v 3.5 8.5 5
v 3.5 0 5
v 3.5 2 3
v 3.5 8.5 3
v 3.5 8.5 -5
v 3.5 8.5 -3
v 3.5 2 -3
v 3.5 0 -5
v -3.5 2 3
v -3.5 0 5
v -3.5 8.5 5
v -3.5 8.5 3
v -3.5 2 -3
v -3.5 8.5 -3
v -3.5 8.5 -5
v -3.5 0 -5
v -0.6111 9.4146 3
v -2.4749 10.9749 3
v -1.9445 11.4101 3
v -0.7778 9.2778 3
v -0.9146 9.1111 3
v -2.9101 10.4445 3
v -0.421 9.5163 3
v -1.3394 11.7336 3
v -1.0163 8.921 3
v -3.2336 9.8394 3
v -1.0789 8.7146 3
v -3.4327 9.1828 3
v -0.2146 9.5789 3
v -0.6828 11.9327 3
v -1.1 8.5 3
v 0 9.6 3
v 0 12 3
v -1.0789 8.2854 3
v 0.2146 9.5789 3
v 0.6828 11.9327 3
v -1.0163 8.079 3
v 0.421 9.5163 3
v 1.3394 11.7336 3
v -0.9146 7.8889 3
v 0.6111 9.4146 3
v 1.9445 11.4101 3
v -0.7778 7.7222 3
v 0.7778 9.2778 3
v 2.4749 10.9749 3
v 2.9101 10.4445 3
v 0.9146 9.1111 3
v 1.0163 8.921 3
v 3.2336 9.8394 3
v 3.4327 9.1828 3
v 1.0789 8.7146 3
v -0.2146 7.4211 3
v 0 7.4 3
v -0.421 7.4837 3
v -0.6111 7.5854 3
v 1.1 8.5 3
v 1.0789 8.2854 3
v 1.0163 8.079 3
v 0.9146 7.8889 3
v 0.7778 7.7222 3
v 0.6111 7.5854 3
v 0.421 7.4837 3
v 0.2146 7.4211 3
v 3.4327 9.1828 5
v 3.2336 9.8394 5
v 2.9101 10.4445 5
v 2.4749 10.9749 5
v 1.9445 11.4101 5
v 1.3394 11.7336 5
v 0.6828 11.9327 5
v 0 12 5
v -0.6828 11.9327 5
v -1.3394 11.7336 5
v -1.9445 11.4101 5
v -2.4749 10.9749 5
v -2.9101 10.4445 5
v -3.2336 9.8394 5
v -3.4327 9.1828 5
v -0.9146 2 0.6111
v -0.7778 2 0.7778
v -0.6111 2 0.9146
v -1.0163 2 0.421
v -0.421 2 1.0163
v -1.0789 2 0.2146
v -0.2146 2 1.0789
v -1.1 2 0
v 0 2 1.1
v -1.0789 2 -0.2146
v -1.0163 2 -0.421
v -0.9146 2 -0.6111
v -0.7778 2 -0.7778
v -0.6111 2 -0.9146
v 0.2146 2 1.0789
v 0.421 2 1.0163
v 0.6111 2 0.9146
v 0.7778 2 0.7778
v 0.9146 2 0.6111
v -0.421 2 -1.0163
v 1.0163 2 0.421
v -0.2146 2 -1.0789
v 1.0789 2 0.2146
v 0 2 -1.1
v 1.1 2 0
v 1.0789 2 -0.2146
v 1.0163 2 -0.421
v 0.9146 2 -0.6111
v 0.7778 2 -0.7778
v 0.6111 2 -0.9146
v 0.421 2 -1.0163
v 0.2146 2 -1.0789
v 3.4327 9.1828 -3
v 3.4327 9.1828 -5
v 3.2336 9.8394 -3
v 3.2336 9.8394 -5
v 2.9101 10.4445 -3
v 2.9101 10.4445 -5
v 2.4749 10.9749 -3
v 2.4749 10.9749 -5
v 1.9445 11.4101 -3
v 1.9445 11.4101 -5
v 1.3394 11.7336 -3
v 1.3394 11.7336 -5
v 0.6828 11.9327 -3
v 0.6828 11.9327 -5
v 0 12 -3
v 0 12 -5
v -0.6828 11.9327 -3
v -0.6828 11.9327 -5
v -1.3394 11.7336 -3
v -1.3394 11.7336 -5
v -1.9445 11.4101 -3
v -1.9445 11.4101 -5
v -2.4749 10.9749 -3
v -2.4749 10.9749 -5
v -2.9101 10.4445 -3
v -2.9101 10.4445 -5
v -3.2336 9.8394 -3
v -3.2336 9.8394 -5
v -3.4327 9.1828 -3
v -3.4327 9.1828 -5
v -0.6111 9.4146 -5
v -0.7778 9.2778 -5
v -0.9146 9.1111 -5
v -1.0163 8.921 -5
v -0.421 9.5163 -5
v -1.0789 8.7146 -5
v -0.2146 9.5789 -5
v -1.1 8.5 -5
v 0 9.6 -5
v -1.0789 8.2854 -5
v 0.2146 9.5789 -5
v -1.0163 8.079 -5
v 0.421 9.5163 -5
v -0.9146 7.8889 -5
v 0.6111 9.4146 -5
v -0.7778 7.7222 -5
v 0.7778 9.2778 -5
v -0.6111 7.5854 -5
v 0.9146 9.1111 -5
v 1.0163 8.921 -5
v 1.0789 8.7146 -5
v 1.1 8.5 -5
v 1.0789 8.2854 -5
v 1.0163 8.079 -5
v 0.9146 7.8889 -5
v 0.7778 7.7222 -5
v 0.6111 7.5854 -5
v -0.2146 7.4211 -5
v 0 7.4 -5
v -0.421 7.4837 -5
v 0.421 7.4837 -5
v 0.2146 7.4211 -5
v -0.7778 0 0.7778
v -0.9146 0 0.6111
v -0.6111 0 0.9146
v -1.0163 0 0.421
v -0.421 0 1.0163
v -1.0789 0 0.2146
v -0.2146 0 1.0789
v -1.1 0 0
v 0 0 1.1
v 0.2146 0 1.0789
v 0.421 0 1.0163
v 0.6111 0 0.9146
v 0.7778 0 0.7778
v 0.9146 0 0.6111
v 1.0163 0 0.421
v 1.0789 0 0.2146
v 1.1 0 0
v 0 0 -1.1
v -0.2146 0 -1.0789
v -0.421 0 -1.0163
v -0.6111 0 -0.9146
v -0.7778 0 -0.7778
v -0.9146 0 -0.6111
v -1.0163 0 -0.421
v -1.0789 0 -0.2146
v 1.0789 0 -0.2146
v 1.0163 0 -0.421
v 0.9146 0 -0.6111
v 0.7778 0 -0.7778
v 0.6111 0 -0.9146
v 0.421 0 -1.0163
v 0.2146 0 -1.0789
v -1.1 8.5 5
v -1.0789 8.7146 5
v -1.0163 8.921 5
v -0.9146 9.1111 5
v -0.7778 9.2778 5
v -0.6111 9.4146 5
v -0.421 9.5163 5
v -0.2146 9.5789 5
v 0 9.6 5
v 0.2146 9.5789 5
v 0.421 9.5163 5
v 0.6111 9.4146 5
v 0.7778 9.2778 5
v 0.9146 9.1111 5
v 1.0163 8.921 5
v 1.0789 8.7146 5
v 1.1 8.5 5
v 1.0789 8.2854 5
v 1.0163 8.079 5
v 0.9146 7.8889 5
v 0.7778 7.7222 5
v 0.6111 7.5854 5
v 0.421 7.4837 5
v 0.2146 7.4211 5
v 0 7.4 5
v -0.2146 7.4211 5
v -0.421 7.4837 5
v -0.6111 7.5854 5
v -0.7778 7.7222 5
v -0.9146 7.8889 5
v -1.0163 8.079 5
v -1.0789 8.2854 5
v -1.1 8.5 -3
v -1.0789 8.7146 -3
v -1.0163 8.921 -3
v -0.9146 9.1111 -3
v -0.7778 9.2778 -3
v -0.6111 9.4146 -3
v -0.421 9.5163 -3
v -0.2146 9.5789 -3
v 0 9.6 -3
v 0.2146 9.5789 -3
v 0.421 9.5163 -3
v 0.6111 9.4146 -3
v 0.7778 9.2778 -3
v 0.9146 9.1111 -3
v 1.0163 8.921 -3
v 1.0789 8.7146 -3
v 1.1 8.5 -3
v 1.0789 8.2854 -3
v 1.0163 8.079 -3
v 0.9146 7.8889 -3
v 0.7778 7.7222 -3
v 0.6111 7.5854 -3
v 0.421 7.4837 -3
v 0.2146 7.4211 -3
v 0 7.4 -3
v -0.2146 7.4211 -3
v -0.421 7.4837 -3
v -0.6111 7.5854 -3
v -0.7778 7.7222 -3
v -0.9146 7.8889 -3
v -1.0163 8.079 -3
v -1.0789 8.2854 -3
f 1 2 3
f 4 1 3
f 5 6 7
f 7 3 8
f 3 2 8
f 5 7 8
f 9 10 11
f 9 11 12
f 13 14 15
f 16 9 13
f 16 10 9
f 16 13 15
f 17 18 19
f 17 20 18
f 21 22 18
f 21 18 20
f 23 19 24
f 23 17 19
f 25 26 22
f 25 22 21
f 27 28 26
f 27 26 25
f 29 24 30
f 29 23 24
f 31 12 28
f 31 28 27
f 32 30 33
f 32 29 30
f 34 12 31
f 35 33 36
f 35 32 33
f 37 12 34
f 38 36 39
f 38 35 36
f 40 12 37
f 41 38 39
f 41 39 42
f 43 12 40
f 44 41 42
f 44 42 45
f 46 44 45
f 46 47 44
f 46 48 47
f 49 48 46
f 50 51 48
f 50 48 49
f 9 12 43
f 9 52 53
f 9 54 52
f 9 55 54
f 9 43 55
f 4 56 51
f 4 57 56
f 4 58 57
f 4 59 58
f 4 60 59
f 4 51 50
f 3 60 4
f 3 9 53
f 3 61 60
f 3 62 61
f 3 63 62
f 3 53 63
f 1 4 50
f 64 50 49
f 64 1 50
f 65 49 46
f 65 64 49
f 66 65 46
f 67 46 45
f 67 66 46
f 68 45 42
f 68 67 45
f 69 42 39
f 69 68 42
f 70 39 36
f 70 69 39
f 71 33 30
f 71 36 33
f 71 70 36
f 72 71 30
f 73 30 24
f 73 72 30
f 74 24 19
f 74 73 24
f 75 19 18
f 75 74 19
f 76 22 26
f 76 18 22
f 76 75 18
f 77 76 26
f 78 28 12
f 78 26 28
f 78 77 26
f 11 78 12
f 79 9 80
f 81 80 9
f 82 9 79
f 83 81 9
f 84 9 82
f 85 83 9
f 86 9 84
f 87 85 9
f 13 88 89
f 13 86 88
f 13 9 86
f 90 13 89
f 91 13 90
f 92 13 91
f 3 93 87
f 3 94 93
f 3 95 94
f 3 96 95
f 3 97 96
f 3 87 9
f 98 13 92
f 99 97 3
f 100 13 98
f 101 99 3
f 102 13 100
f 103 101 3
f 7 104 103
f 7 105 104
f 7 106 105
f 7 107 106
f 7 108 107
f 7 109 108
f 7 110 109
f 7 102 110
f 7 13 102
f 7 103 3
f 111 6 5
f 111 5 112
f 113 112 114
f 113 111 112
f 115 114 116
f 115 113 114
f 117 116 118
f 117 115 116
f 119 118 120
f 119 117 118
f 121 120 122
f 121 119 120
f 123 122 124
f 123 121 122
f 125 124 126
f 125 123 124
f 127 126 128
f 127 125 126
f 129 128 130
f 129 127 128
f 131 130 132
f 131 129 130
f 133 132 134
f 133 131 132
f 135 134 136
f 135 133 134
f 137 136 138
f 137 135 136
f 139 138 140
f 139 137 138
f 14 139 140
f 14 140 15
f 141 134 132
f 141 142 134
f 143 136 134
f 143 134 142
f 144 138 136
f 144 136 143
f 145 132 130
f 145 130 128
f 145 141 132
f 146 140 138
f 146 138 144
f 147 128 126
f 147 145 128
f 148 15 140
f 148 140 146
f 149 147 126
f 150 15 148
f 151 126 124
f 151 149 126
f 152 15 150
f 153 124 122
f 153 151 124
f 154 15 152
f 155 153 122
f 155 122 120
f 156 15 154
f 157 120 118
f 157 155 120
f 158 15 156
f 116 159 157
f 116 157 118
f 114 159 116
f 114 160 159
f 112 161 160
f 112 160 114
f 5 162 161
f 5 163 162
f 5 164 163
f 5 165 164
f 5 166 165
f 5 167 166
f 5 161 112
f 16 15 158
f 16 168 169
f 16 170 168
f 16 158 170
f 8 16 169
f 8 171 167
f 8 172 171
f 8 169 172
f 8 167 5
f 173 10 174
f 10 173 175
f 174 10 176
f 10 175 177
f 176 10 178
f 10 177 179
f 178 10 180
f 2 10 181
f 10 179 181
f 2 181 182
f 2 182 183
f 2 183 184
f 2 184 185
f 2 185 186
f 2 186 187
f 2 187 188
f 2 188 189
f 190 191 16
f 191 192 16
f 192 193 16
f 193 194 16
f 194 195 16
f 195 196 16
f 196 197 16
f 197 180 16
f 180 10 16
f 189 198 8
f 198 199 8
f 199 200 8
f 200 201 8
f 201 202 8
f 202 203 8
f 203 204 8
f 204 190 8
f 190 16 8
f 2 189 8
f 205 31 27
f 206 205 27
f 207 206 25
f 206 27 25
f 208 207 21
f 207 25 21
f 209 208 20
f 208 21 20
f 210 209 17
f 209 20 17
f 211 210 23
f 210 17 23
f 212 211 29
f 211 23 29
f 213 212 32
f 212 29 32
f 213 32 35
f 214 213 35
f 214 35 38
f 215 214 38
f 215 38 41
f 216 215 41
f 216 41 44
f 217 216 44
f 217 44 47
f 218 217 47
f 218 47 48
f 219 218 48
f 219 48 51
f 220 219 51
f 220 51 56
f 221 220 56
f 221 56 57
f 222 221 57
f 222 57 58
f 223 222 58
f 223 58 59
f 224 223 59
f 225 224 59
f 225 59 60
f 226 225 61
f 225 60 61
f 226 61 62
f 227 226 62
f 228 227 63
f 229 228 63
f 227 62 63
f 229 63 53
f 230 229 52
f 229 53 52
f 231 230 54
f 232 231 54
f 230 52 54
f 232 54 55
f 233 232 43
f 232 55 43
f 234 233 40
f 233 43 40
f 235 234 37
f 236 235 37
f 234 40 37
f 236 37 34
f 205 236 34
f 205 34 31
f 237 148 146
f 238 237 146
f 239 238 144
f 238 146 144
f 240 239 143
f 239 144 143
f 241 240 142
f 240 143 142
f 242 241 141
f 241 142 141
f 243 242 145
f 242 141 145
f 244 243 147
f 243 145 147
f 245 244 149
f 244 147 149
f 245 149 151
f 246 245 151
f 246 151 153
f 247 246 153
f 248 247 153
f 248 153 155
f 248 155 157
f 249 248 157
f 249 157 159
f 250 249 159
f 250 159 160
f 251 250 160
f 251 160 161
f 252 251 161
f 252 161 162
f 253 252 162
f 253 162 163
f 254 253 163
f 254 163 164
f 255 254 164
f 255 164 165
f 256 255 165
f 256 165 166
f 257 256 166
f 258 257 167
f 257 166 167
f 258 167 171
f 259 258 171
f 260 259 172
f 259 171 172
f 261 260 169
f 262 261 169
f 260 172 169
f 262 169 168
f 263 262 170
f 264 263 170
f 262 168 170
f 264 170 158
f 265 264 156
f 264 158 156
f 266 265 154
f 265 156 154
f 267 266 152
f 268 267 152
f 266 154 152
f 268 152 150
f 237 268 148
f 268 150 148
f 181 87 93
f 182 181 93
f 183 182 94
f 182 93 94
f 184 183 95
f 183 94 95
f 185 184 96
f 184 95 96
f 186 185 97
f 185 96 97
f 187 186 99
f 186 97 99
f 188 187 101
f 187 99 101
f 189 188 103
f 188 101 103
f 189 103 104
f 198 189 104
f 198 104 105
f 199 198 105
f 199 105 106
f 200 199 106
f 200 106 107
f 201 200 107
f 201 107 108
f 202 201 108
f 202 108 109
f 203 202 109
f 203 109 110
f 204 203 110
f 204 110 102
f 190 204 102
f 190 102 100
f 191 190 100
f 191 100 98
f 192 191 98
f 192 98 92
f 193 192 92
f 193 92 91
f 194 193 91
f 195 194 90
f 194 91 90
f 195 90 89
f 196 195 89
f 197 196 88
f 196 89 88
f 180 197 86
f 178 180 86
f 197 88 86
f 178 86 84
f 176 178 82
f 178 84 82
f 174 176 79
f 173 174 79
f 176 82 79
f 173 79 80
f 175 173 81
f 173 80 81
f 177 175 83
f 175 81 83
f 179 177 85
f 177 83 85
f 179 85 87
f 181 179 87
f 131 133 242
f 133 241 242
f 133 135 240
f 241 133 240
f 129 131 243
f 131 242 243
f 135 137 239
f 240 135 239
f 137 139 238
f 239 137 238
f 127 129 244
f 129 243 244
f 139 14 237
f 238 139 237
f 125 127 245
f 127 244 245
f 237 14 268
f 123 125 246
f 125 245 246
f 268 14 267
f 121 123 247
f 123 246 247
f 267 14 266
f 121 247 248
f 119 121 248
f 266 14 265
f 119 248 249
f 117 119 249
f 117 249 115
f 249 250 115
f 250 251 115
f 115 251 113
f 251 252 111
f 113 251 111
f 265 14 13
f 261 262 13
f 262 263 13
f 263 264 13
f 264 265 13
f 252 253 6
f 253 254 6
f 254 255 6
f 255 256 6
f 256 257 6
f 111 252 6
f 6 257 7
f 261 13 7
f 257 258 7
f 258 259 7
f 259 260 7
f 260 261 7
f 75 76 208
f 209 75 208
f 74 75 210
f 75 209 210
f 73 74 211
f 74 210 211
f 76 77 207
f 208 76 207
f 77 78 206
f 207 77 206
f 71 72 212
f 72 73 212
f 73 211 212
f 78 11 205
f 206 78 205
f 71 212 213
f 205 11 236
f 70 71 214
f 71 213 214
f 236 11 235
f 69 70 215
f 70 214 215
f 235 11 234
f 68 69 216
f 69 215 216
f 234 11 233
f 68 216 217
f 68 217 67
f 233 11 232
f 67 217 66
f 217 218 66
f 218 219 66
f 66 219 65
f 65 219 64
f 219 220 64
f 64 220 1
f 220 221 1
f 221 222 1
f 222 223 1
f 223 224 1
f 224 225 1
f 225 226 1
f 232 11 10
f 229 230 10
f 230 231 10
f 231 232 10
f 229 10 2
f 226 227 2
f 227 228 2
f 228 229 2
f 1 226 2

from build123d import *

# Parameters (mm, degrees)
SKETCH_1_W          = 7
SKETCH_1_H          = 10
EXTRUDE_1_DEPTH     = 2
SKETCH_2_W          = 7
SKETCH_2_H          = 2
EXTRUDE_2_DEPTH     = 10
FILLET_1_RADIUS     = 3.5
FILLET_1_LENGTH     = 2
FILLET_2_RADIUS     = 3.5
FILLET_2_LENGTH     = 2
SKETCH_3_R          = 1.1
CUT_EXTRUDE_1_DEPTH = 25
SKETCH_4_R          = 1.1
CUT_EXTRUDE_2_DEPTH = 25


with BuildPart() as part:
    # 草图1 → 凸台-拉伸1 (new body)
    with BuildSketch(Plane(origin=(0, 0, 0), x_dir=(1, 0, 0), z_dir=(0, 1, 0))):
        Rectangle(SKETCH_1_W, SKETCH_1_H)
    extrude(amount=EXTRUDE_1_DEPTH)

    # 草图2 → 凸台-拉伸2 (add)
    with BuildSketch(Plane(origin=(0, 2, 0), x_dir=(1, 0, 0), z_dir=(0, 1, 0))):
        with Locations((0, -4)):
            Rectangle(SKETCH_2_W, SKETCH_2_H)
        with Locations((0, 4)):
            Rectangle(SKETCH_2_W, SKETCH_2_H)
    extrude(amount=EXTRUDE_2_DEPTH)

    # 圆角1: full round fillet: the end face becomes a half cylinder, R = half its width
    fillet_1_face = Plane((0, 12, 4), x_dir=(0, 0, 1), z_dir=(0, 1, 0))  # on the end face: x along it, z out of the body
    fillet_1_slab = fillet_1_face.offset(-FILLET_1_RADIUS / 2) * Box(FILLET_1_LENGTH, 2 * FILLET_1_RADIUS, FILLET_1_RADIUS, mode=Mode.PRIVATE)  # the body's end, R deep
    fillet_1_round = Plane((0, 8.5, 4), x_dir=(0, 1, 0), z_dir=(0, 0, 1)) * Cylinder(FILLET_1_RADIUS, FILLET_1_LENGTH, mode=Mode.PRIVATE)  # its axis R under the face
    add(fillet_1_slab - fillet_1_round, mode=Mode.SUBTRACT)

    # 圆角2: full round fillet: the end face becomes a half cylinder, R = half its width
    fillet_2_face = Plane((0, 12, -4), x_dir=(0, 0, 1), z_dir=(0, 1, 0))  # on the end face: x along it, z out of the body
    fillet_2_slab = fillet_2_face.offset(-FILLET_2_RADIUS / 2) * Box(FILLET_2_LENGTH, 2 * FILLET_2_RADIUS, FILLET_2_RADIUS, mode=Mode.PRIVATE)  # the body's end, R deep
    fillet_2_round = Plane((0, 8.5, -4), x_dir=(0, 1, 0), z_dir=(0, 0, 1)) * Cylinder(FILLET_2_RADIUS, FILLET_2_LENGTH, mode=Mode.PRIVATE)  # its axis R under the face
    add(fillet_2_slab - fillet_2_round, mode=Mode.SUBTRACT)

    # 草图3 → 切除-拉伸1 (cut)
    with BuildSketch(Plane(origin=(0, 0, -5), x_dir=(-1, 0, 0), z_dir=(0, 0, -1))):
        with Locations((0, 8.5)):
            Circle(SKETCH_3_R)
    extrude(amount=-CUT_EXTRUDE_1_DEPTH, mode=Mode.SUBTRACT)

    # 草图4 → 切除-拉伸2 (cut)
    with BuildSketch(Plane(origin=(0, 2, 0), x_dir=(1, 0, 0), z_dir=(0, 1, 0))):
        with Locations(Location((0, 0, 0), (0, 0, 270))):
            Circle(SKETCH_4_R)
    extrude(amount=-CUT_EXTRUDE_2_DEPTH, mode=Mode.SUBTRACT)


solid = part.part
